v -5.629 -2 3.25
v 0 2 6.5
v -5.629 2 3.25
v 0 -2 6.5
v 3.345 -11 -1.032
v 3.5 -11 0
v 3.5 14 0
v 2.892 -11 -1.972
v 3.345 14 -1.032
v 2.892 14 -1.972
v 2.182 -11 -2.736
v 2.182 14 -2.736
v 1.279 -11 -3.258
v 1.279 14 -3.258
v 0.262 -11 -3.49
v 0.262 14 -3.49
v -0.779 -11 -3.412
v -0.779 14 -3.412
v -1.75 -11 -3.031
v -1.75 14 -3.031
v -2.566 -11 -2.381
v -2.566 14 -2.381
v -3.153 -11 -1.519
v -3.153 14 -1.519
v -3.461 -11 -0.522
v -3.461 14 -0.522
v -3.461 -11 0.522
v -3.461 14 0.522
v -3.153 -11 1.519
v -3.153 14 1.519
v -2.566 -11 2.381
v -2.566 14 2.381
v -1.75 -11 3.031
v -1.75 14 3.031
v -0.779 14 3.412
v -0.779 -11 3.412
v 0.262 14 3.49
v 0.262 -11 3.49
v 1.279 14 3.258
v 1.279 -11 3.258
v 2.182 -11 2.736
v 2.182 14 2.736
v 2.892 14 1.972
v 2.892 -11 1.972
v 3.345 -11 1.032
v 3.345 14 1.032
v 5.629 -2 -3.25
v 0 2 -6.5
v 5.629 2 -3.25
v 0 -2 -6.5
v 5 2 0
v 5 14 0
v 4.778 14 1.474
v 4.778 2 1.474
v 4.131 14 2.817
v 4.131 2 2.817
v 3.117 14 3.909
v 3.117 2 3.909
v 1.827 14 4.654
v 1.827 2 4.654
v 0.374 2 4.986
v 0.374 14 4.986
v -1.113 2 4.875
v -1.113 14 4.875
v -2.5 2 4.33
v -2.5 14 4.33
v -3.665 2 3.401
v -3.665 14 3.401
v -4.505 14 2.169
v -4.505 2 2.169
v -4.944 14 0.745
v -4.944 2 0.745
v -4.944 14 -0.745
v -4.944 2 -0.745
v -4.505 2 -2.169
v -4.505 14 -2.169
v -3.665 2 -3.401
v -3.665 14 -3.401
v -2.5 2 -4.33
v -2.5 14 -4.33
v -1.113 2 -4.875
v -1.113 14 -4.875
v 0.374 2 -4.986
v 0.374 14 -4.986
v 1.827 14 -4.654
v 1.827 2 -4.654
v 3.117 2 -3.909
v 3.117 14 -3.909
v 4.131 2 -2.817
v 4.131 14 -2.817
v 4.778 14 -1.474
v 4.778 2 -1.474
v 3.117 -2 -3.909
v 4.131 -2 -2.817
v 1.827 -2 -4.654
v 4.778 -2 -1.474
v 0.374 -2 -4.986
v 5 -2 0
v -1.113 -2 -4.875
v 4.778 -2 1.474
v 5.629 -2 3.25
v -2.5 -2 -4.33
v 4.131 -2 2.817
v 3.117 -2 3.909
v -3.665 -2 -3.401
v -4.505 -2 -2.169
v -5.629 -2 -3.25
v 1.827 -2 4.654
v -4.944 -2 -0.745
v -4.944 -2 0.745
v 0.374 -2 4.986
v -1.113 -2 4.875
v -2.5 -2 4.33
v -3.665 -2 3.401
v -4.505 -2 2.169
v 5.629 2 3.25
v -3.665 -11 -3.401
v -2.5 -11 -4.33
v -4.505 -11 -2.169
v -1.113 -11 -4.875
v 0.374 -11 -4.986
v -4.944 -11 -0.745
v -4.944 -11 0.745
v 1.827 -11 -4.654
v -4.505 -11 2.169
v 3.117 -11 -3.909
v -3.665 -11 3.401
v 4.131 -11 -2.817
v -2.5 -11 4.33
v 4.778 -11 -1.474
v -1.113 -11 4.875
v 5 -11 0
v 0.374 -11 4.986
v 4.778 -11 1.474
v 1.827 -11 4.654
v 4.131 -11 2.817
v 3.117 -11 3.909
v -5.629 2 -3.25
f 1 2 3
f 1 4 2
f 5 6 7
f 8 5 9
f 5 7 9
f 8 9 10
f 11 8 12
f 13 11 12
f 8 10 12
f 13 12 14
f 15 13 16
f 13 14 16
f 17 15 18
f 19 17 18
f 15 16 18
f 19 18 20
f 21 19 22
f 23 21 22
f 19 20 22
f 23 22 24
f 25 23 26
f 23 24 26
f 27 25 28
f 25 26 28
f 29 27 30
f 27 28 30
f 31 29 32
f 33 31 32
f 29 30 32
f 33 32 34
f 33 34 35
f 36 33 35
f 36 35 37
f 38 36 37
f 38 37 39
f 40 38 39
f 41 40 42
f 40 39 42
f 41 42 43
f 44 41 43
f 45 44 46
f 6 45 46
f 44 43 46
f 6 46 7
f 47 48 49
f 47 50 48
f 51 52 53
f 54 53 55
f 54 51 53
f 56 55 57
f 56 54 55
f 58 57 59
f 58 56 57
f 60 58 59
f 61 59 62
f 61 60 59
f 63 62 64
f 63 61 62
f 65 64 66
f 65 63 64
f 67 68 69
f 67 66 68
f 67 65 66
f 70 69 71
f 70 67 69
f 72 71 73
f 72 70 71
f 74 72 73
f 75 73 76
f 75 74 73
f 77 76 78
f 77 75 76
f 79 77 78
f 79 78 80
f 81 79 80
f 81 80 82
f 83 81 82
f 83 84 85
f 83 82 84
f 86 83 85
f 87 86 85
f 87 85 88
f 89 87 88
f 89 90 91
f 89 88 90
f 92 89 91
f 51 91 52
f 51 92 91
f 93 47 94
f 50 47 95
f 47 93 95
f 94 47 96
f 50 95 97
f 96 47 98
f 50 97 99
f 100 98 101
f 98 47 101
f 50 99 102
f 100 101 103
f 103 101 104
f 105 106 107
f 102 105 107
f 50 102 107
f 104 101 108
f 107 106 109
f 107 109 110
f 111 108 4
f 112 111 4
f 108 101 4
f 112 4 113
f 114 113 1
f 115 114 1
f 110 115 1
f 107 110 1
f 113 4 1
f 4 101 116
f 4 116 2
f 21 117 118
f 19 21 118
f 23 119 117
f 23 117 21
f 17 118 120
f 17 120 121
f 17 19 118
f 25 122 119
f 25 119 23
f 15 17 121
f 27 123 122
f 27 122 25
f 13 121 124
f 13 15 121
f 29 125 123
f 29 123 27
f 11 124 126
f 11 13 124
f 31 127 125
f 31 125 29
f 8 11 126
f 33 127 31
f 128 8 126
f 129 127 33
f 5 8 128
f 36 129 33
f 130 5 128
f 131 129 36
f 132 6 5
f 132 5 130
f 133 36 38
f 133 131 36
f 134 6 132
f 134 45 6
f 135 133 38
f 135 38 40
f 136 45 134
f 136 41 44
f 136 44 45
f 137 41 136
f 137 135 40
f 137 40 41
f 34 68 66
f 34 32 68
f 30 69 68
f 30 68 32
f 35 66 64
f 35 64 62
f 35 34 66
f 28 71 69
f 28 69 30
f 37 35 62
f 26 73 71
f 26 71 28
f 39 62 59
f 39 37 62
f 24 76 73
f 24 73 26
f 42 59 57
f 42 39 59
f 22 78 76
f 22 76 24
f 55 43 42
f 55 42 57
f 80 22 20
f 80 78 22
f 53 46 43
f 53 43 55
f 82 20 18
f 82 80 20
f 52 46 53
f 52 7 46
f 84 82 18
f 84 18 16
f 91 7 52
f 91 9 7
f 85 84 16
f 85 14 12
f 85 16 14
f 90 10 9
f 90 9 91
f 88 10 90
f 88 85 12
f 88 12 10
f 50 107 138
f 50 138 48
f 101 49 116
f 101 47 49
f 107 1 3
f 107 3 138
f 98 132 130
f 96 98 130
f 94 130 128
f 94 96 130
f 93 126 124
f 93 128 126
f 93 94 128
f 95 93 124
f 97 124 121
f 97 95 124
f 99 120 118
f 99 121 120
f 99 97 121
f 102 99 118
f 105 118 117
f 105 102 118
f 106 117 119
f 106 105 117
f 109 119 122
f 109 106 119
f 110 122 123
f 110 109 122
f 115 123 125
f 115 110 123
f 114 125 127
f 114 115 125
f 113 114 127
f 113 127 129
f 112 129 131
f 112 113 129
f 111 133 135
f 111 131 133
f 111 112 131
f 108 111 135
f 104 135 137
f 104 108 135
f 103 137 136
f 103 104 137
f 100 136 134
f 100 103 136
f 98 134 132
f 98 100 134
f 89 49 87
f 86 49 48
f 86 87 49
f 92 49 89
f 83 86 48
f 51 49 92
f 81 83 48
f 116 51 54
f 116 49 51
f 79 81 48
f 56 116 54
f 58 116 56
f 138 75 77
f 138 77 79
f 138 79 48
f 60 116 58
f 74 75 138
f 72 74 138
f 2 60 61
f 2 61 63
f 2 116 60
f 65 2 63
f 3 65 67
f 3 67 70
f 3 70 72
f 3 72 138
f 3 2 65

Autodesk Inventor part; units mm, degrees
ref_plane "YZ Plane" through (0, 0, 0) normal (1, 0, 0) x (0, 1, 0)
ref_plane "XZ Plane" through (0, 0, 0) normal (0, 1, 0) x (-1, 0, 0)
ref_plane "XY Plane" through (0, 0, 0) normal (0, 0, 1) x (1, 0, 0)
sketch "Skizze1" plane through (0, 0, 0) normal (0, 1, 0) x (-1, 0, 0)
  line L0 (0, 6.5) -> (5.6292, 3.25)
  line L1 (5.6292, 3.25) -> (5.6292, -3.25)
  line L2 (5.6292, -3.25) -> (0, -6.5)
  line L3 (0, -6.5) -> (-5.6292, -3.25)
  line L4 (-5.6292, -3.25) -> (-5.6292, 3.25)
  line L5 (-5.6292, 3.25) -> (0, 6.5)
  circle A0 centre (0, 0) radius 5
  dimension "d0" = 10
  dimension "d1" = 13
extrude "Extrusion1" add sketch "Skizze1" along normal mid plane 4
sketch "Skizze2" plane through (0, 2, 0) normal (0, 1, 0) x (1, 0, 0)
  circle A0 centre (0, 0) radius 5
extrude "Extrusion2" add sketch "Skizze2" along normal blind 12
sketch "Skizze3" plane through (0, 2, 0) normal (0, -1, 0) x (1, 0, 0)
  circle A0 centre (0, 0) radius 5
extrude "Extrusion3" add sketch "Skizze3" along normal blind 13
thread "Gewinde1" size "M10x1.5" class "6g" standard "ISO Metric profile" length 12
thread "Gewinde2" size "M10x1.5" class "6g" standard "ISO Metric profile" length 9
sketch "Skizze4" plane through (0, 14, 0) normal (0, 1, 0) x (1, 0, 0)
  circle A0 centre (0, 0) radius 3.5
  dimension "d12" = 7
extrude "Extrusion4" cut sketch "Skizze4" against normal up to surface (25 mm away)
properties part number "1154"
